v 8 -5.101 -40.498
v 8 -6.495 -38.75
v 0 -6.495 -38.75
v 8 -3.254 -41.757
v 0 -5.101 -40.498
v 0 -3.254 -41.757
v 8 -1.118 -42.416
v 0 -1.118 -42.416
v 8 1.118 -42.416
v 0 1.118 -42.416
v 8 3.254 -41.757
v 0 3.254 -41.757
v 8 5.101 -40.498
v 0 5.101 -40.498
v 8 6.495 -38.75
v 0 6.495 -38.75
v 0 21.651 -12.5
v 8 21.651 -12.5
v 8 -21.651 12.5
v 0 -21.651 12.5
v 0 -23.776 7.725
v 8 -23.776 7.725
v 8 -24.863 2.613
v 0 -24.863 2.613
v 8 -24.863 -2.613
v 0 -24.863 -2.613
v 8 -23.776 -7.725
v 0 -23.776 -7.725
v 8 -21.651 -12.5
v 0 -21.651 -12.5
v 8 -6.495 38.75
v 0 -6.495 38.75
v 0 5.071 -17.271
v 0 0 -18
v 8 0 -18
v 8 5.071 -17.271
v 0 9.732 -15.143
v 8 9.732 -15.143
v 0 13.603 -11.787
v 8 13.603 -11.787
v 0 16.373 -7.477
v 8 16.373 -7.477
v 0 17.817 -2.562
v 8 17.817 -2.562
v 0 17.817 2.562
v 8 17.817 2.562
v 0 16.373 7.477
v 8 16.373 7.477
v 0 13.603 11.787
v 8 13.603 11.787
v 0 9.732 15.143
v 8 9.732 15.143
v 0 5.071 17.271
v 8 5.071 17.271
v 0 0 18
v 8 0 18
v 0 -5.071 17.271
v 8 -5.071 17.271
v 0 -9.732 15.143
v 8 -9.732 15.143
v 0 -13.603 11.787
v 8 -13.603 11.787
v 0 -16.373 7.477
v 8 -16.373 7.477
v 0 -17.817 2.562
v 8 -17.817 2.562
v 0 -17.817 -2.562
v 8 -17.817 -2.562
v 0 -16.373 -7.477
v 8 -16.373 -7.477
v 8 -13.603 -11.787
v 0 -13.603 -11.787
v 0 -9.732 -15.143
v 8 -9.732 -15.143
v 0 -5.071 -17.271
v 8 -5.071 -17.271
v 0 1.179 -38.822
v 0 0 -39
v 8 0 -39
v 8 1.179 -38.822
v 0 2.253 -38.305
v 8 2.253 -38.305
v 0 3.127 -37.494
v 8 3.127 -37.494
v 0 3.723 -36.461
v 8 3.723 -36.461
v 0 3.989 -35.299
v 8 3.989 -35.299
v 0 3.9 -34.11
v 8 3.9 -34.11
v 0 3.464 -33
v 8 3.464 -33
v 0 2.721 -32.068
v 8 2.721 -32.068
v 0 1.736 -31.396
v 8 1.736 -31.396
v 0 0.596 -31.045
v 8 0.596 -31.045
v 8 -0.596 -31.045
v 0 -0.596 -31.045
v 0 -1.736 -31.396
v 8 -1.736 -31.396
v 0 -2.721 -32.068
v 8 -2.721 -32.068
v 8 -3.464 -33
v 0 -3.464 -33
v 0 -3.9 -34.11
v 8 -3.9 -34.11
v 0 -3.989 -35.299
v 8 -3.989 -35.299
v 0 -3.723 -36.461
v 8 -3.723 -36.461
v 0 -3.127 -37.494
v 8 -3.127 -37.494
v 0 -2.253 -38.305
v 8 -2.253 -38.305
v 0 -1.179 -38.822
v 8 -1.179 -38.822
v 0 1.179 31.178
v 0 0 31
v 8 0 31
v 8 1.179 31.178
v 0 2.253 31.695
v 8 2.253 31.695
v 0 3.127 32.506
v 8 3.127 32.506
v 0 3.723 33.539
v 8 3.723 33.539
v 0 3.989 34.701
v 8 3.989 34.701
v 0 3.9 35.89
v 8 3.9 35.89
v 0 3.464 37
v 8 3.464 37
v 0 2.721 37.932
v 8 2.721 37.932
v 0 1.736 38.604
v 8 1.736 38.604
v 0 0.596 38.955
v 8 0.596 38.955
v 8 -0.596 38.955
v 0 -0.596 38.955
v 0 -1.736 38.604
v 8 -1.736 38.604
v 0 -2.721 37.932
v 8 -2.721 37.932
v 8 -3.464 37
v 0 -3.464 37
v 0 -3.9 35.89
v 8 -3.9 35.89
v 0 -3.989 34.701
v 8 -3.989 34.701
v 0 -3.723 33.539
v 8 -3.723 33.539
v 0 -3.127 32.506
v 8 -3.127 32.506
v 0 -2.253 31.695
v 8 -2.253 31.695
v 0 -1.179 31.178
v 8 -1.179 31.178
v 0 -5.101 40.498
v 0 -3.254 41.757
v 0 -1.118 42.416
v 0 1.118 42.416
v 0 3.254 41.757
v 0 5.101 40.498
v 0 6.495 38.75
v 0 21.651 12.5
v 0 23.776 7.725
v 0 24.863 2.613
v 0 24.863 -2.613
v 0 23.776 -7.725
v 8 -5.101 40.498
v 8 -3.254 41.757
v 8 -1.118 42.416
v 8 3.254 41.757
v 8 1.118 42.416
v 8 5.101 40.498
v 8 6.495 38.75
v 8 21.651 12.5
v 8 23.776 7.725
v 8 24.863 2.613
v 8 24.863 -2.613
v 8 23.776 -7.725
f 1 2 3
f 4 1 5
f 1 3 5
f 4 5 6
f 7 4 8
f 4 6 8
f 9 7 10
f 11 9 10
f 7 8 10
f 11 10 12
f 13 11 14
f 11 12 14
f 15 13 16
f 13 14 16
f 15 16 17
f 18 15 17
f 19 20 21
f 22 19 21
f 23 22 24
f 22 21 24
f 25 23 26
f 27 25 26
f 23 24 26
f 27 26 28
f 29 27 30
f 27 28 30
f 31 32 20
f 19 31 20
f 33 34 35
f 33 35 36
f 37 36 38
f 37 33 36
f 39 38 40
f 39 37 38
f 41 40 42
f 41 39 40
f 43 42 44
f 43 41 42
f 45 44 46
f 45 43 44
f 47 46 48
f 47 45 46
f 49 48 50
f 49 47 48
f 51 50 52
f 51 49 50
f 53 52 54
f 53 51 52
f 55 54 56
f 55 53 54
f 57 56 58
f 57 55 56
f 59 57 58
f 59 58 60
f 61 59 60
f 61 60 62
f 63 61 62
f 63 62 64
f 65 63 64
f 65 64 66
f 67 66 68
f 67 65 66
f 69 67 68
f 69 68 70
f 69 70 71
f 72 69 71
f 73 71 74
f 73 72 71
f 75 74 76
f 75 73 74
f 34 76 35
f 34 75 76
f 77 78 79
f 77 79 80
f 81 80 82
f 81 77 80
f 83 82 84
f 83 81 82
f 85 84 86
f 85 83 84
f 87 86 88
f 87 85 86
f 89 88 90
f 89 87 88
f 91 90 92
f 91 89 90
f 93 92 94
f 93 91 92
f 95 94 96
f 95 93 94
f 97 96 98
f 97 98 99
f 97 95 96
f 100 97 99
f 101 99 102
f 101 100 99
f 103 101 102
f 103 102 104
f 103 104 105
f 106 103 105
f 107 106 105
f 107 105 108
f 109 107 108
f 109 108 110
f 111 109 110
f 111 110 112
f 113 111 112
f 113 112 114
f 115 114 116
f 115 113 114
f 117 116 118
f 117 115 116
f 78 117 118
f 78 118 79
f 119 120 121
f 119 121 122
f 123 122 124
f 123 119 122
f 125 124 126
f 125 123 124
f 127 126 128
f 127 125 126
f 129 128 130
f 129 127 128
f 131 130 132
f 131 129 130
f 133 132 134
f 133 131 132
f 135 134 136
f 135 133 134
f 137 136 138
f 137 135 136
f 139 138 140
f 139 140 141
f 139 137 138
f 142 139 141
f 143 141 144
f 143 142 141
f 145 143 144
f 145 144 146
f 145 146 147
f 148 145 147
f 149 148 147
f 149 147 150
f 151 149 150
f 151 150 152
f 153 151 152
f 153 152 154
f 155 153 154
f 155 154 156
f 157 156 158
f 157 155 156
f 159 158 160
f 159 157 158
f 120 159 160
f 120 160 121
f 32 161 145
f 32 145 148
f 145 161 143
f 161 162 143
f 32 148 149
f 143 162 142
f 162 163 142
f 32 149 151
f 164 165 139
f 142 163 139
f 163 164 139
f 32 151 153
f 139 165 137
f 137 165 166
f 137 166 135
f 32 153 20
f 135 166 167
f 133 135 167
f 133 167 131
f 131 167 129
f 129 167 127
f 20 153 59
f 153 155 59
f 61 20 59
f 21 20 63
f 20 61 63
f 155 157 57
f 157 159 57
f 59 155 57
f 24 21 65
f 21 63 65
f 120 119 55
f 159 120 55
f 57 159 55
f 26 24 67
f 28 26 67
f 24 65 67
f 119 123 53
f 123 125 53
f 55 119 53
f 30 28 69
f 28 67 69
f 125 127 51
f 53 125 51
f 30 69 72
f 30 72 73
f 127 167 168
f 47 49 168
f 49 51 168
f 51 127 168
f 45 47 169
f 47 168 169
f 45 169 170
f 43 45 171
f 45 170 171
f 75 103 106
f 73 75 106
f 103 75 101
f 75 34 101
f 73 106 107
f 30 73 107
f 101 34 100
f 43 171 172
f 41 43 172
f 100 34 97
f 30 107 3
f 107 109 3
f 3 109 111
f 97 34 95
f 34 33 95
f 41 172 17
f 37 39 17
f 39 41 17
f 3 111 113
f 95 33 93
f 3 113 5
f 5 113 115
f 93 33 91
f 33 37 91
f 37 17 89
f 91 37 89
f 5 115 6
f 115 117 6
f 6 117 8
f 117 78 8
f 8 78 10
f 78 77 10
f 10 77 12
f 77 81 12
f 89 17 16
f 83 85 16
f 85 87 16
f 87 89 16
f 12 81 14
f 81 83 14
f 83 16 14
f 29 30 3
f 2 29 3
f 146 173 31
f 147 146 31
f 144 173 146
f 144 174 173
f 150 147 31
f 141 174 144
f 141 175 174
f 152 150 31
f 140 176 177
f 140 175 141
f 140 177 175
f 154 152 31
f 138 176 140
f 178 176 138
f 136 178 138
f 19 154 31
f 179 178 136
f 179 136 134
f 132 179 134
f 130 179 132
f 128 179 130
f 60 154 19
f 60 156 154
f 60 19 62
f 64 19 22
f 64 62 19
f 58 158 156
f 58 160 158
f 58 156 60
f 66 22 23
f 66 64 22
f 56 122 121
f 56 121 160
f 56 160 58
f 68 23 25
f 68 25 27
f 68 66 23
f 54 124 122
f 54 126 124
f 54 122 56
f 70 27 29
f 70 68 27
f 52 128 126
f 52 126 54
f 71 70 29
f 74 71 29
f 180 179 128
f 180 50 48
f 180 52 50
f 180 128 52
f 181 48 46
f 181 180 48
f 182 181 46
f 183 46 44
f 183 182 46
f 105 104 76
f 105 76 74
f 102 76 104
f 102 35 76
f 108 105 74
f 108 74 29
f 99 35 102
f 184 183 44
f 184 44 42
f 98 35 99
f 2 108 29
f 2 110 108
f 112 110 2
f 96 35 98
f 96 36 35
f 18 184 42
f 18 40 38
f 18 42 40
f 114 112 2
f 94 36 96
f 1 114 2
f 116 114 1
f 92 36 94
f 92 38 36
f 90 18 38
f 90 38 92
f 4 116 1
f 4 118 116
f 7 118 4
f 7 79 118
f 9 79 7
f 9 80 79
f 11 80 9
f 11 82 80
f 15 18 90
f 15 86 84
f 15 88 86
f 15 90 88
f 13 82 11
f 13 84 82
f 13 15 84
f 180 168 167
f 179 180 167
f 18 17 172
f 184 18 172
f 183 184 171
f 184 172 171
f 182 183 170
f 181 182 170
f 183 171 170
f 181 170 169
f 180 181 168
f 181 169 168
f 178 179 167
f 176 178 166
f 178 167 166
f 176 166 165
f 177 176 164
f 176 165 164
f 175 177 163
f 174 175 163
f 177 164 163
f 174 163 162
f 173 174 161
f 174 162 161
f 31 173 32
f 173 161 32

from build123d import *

# Parameters (mm, degrees)
SKETCH1_R           = 4
SKETCH1_R_2         = 18
BOSS_EXTRUDE1_DEPTH = 8


with BuildPart() as part:
    # Sketch1 → Boss-Extrude1 (new body)
    with BuildSketch(Plane(origin=(0, 0, 0), x_dir=(0, 0, -1), z_dir=(1, 0, 0))):
        with BuildLine():
            ThreePointArc((-38.75, 6.495190528), (-42.5, 0), (-38.75, -6.495190528))
            Line((-38.75, -6.495190528), (-12.5, -21.650635095))
            ThreePointArc((-12.5, -21.650635095), (0, -25), (12.5, -21.650635095))
            Line((12.5, -21.650635095), (38.75, -6.495190528))
            ThreePointArc((38.75, -6.495190528), (42.5, 0), (38.75, 6.495190528))
            Line((38.75, 6.495190528), (12.5, 21.650635095))
            ThreePointArc((12.5, 21.650635095), (0, 25), (-12.5, 21.650635095))
            Line((-12.5, 21.650635095), (-38.75, 6.495190528))
        make_face()
        with Locations((-35, 0)):
            Circle(SKETCH1_R, mode=Mode.SUBTRACT)
        Circle(SKETCH1_R_2, mode=Mode.SUBTRACT)
        with Locations((35, 0)):
            Circle(SKETCH1_R, mode=Mode.SUBTRACT)
    extrude(amount=BOSS_EXTRUDE1_DEPTH)


solid = part.part
